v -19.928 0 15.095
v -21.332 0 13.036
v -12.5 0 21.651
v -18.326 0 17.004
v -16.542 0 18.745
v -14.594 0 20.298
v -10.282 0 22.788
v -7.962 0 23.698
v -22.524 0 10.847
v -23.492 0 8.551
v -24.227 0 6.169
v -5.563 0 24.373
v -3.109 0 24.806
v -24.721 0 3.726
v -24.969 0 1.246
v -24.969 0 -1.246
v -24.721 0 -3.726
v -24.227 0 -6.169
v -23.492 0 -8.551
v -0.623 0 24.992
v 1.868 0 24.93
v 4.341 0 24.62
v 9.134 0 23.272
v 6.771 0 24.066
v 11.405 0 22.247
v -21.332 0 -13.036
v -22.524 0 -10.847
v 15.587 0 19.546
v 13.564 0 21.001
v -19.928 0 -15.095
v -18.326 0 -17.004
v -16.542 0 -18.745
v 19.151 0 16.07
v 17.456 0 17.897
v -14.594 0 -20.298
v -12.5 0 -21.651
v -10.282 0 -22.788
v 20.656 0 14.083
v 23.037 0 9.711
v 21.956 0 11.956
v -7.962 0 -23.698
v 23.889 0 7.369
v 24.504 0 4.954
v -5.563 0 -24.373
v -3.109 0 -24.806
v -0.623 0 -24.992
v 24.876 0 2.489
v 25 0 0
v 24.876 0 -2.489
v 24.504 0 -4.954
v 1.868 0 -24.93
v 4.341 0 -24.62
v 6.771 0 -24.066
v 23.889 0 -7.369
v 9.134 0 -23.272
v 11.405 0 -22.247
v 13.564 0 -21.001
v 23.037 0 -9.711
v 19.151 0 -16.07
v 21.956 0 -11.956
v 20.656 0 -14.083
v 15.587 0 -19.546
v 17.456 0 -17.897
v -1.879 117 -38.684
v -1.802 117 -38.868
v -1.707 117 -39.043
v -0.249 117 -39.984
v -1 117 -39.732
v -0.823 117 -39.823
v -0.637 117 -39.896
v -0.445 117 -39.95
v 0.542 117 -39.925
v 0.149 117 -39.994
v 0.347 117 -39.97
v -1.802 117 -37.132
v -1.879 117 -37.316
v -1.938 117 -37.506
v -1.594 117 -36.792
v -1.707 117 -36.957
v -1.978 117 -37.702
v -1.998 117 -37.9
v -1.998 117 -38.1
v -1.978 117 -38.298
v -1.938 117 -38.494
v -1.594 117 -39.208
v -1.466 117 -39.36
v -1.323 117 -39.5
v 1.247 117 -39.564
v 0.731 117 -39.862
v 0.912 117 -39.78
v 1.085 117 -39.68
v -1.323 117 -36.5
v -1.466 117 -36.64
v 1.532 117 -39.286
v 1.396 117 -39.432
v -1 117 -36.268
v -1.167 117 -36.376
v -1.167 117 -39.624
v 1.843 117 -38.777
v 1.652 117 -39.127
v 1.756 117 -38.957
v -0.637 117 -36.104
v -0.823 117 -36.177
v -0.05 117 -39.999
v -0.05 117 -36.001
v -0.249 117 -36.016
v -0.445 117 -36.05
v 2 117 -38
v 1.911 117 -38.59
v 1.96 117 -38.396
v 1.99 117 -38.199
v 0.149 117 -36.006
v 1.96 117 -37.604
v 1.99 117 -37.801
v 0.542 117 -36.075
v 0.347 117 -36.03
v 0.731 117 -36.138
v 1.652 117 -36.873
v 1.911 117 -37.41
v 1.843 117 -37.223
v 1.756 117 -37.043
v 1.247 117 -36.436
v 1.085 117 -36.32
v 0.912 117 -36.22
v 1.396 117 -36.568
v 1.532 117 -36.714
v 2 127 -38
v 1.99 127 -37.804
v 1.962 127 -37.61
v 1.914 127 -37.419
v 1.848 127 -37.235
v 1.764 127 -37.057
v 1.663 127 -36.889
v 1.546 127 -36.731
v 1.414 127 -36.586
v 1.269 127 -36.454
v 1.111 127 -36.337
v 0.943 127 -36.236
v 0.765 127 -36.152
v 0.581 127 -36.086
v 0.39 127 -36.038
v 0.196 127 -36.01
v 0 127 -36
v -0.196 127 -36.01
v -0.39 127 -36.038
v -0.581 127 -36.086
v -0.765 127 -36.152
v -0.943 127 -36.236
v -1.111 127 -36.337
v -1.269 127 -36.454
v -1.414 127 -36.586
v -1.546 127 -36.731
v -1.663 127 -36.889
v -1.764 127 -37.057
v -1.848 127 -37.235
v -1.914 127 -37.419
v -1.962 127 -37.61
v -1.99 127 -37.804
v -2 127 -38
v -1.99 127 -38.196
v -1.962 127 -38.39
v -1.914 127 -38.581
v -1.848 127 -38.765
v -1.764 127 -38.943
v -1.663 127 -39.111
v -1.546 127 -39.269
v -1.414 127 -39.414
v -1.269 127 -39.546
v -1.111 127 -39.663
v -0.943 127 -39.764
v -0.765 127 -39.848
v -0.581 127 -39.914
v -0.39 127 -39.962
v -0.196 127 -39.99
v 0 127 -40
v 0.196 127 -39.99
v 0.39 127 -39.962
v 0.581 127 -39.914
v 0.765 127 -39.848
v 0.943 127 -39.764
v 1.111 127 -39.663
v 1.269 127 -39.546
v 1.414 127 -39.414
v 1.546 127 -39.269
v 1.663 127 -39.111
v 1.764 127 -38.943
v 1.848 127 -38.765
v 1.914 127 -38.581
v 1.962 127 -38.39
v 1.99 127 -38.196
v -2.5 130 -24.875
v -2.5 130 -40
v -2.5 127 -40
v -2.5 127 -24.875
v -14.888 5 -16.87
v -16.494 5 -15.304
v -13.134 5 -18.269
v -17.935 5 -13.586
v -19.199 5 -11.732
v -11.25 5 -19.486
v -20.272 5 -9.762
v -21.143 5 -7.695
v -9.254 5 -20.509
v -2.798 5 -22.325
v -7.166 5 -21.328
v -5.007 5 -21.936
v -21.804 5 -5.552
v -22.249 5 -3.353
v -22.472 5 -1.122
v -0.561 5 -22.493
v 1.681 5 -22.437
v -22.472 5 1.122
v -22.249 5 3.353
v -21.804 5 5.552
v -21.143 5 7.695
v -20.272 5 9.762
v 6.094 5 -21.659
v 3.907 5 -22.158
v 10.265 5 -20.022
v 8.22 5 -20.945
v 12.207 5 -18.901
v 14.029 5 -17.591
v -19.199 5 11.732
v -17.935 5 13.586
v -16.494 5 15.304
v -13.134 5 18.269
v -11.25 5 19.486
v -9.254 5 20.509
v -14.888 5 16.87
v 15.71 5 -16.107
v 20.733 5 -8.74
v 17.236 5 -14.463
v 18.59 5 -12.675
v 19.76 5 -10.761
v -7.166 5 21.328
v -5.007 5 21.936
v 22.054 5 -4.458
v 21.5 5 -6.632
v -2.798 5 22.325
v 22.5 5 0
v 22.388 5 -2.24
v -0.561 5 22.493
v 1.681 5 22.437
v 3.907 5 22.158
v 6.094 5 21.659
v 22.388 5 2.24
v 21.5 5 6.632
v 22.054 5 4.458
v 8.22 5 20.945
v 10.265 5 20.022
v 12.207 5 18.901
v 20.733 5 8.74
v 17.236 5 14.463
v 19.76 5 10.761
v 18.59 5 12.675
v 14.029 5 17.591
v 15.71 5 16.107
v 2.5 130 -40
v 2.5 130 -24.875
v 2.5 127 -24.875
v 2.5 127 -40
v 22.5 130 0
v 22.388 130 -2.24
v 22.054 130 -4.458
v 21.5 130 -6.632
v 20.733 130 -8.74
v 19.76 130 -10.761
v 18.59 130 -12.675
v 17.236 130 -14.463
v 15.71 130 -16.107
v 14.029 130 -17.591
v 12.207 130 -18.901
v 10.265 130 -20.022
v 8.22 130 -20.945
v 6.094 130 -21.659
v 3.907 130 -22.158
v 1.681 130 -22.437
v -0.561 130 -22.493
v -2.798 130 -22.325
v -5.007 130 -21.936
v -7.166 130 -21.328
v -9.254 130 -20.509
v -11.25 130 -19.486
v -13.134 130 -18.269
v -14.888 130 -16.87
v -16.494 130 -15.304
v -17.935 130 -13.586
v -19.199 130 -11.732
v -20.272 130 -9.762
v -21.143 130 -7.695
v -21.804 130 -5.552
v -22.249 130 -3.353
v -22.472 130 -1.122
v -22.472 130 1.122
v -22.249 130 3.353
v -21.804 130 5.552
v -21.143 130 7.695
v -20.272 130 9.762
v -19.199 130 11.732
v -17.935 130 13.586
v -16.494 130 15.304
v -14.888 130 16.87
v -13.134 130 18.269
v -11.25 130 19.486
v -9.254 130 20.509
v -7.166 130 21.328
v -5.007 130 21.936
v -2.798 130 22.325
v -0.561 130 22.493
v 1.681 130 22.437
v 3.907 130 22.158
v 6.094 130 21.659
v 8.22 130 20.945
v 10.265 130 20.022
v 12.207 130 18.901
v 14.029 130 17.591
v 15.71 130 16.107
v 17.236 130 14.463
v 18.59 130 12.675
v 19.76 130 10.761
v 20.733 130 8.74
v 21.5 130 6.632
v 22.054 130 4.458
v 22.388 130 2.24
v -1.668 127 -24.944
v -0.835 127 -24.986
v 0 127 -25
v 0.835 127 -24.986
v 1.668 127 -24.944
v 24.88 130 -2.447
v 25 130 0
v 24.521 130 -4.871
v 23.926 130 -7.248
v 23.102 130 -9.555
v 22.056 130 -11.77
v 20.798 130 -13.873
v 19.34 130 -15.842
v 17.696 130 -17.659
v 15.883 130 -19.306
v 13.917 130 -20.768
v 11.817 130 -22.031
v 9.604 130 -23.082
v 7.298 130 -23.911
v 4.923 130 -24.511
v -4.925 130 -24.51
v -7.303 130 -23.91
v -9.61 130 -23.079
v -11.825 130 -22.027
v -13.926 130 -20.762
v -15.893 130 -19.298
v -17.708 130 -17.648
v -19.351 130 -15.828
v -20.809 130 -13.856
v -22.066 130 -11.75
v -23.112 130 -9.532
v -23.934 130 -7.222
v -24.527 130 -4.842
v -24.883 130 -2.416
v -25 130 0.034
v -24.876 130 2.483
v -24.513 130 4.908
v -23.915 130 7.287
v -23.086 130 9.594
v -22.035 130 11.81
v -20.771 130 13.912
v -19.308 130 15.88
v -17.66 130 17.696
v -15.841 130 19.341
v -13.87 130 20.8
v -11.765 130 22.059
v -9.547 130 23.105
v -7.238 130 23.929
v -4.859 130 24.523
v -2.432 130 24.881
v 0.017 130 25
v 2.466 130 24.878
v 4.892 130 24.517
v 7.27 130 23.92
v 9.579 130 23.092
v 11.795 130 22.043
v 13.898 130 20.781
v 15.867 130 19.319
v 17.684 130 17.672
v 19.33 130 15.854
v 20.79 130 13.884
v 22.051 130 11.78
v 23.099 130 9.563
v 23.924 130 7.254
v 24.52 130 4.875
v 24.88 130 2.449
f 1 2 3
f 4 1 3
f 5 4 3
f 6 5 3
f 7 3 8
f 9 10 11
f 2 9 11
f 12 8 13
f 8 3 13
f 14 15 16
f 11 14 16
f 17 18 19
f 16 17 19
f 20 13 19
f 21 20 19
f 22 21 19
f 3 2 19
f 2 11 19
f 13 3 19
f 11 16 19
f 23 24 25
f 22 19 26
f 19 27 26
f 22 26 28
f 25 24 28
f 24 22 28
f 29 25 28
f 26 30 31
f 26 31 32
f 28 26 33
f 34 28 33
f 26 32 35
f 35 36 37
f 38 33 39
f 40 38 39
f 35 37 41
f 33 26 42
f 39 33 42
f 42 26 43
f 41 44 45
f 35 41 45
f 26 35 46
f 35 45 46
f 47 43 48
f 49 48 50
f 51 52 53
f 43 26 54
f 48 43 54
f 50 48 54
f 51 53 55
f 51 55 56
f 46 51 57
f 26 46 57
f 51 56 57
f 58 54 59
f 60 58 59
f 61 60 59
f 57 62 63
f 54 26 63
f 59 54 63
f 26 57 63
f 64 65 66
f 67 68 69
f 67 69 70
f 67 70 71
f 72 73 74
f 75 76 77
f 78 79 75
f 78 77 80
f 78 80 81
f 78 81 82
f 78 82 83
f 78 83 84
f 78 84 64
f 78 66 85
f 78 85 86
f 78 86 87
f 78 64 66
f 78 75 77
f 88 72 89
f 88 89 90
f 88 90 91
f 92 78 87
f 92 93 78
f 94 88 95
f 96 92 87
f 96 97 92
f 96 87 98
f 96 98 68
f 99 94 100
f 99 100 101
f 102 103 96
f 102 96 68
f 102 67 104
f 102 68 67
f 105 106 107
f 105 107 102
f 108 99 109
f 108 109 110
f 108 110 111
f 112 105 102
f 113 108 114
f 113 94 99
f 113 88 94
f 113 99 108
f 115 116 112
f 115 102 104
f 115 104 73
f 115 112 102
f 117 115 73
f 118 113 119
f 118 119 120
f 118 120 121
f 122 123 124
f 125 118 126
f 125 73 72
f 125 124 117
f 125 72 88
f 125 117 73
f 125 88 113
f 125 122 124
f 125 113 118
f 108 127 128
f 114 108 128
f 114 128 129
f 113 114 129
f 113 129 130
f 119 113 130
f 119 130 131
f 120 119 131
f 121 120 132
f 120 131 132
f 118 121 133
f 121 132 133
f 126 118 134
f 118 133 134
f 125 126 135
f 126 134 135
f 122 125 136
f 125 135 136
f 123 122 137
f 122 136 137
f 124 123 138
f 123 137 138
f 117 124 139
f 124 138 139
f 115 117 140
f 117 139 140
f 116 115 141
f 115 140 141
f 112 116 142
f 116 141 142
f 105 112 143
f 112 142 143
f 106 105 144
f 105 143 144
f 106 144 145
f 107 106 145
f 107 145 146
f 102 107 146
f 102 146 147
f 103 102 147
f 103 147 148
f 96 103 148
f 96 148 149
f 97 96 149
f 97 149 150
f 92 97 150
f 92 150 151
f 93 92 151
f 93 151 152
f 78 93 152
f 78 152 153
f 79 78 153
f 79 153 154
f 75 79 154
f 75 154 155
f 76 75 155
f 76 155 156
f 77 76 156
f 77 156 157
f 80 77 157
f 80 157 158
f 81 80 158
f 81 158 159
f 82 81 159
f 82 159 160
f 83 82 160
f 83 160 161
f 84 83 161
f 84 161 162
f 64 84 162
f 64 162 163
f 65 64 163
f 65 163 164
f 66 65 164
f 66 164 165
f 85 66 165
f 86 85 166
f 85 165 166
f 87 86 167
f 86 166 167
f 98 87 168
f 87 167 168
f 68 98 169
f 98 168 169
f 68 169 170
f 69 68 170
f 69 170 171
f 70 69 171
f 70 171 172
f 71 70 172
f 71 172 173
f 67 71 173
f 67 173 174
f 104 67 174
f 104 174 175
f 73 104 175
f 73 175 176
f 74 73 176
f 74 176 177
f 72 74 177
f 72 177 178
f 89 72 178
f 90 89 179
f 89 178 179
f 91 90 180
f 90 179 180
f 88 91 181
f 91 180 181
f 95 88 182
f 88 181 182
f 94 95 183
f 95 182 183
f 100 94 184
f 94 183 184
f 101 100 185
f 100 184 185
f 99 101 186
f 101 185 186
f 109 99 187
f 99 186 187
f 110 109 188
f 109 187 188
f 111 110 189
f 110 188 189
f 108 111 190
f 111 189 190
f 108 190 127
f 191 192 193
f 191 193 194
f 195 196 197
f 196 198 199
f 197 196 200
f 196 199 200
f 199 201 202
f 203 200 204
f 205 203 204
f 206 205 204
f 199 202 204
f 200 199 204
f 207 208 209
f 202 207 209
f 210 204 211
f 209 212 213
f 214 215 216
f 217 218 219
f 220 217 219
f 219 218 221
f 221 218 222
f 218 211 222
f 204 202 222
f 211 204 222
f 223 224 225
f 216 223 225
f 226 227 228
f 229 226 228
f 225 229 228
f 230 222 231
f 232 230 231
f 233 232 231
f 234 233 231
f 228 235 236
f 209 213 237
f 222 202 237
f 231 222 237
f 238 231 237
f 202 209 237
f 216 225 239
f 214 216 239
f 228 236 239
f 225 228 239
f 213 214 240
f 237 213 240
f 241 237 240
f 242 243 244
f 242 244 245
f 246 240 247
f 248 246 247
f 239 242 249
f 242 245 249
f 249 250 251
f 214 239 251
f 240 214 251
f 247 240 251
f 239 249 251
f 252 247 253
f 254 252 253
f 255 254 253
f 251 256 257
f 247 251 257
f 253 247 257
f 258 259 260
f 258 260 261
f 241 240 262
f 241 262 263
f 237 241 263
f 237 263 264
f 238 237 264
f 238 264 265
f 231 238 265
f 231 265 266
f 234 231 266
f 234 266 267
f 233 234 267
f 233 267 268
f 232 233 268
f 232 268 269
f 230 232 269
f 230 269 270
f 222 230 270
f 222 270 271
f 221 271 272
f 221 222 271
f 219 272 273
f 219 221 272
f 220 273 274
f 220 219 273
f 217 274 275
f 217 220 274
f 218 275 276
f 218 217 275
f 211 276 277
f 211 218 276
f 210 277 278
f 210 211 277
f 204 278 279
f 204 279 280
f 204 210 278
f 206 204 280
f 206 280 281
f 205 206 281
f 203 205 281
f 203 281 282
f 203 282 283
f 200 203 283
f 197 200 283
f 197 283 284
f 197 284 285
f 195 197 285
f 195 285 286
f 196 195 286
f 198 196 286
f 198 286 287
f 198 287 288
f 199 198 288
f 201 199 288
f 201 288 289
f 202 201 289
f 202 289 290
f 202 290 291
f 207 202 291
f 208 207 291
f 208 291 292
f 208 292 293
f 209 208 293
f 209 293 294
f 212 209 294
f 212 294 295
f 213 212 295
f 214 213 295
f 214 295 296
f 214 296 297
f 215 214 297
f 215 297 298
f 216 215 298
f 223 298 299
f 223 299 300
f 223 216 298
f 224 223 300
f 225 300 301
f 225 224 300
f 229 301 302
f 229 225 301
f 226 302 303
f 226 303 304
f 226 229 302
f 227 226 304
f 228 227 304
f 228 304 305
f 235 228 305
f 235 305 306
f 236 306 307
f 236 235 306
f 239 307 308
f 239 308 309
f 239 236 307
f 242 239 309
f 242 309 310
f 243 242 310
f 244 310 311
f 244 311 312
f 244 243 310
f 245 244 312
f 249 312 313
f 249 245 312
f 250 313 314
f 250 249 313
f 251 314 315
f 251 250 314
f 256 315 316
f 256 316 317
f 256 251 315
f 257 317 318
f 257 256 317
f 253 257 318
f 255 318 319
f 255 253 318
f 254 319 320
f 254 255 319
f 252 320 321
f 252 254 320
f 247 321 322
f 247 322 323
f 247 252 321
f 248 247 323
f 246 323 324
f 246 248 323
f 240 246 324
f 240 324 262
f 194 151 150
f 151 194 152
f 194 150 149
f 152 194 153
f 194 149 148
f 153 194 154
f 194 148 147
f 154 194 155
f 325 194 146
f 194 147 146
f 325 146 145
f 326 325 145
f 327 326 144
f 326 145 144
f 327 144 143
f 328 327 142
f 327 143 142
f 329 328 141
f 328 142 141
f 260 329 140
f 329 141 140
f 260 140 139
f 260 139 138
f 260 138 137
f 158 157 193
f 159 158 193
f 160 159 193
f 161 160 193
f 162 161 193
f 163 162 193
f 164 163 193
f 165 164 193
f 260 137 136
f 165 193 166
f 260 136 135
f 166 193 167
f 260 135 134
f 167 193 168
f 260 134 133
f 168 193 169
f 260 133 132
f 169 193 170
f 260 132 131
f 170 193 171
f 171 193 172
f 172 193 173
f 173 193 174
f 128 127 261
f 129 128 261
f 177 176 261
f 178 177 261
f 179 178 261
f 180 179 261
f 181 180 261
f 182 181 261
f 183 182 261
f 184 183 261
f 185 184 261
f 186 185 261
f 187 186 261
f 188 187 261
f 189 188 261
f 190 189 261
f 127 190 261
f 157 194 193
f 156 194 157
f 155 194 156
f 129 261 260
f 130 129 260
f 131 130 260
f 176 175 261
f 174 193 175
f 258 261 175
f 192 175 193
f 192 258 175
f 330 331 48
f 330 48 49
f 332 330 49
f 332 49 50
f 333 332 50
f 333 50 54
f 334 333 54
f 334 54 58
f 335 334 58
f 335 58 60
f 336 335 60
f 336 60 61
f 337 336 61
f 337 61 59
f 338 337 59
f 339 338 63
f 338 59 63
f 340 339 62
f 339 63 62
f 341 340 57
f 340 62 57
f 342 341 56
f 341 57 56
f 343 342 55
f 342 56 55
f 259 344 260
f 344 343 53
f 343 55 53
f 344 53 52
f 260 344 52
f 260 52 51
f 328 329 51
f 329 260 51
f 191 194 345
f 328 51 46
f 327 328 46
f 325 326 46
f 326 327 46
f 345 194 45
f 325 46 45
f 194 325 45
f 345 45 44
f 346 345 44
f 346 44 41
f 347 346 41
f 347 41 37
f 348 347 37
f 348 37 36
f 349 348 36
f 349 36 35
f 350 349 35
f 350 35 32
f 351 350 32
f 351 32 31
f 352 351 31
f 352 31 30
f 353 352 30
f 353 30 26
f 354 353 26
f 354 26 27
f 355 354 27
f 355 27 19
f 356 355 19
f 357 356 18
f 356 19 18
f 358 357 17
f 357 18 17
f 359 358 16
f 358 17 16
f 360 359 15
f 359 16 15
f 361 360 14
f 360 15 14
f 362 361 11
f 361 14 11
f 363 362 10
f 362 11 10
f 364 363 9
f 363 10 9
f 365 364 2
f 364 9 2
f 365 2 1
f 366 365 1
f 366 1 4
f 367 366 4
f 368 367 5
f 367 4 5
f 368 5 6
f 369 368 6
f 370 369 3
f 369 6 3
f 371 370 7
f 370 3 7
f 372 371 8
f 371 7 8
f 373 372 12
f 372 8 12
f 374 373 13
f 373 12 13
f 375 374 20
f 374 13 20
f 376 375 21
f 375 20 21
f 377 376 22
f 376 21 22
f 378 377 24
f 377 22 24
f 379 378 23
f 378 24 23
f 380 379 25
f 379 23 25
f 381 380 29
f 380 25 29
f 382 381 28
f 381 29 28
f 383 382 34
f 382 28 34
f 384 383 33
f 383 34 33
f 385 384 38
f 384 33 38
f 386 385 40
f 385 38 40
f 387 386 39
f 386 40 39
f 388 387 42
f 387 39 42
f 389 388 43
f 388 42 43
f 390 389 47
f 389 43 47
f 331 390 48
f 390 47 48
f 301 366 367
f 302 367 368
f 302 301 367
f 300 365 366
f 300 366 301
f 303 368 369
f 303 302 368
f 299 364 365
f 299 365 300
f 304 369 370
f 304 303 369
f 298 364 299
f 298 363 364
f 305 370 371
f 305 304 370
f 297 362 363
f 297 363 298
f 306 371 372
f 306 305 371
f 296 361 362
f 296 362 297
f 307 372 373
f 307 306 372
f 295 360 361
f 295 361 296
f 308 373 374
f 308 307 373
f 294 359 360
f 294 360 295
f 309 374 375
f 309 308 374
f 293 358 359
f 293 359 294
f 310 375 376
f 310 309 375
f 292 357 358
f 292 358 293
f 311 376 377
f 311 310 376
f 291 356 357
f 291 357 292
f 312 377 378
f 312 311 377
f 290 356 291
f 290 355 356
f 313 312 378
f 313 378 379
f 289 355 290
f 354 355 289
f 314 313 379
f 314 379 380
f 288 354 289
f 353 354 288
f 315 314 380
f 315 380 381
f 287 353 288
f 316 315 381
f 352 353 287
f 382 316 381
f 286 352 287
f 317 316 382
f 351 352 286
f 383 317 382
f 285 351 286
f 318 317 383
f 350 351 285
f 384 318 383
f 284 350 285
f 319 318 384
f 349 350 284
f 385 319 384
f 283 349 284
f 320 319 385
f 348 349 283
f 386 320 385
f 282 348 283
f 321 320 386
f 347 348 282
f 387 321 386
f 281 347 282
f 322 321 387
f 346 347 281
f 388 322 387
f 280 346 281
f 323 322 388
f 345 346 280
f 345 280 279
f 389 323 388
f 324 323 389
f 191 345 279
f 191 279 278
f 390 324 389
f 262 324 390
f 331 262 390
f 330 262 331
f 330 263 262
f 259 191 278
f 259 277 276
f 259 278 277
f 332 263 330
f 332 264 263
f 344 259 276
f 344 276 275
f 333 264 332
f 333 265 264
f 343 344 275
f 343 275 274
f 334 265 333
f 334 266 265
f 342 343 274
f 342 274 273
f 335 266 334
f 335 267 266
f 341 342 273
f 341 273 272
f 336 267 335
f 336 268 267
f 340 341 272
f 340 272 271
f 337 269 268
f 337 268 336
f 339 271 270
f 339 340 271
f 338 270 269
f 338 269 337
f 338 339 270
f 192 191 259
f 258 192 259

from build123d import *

# Parameters (mm, degrees)
SKETCH1_R           = 25
SKETCH1_R_2         = 22.5
BOSS_EXTRUDE1_DEPTH = 130
SKETCH2_R           = 25
BOSS_EXTRUDE2_DEPTH = 5
BOSS_EXTRUDE3_DEPTH = 3
SKETCH4_R           = 2
BOSS_EXTRUDE4_DEPTH = 10


with BuildPart() as part:
    # Sketch1 → Boss-Extrude1 (new body)
    with BuildSketch(Plane(origin=(0, 0, 0), x_dir=(1, 0, 0), z_dir=(0, 1, 0))):
        Circle(SKETCH1_R)
        Circle(SKETCH1_R_2, mode=Mode.SUBTRACT)
    extrude(amount=BOSS_EXTRUDE1_DEPTH)

    # Sketch2 → Boss-Extrude2 (add)
    with BuildSketch(Plane.XZ):
        Circle(SKETCH2_R)
    extrude(amount=-BOSS_EXTRUDE2_DEPTH)

    # Sketch3 → Boss-Extrude3 (add)
    with BuildSketch(Plane(origin=(0, 130, 0), x_dir=(1, 0, 0), z_dir=(0, 1, 0))):
        with BuildLine():
            ThreePointArc((-2.5, 24.874685928), (-1.251569376, 24.968651828), (0, 25))
            Line((0, 25), (0, 40))
            Line((0, 40), (-2.5, 40))
            Line((-2.5, 40), (-2.5, 24.874685928))
        make_face()
        with BuildLine():
            Line((0, 40), (0, 25))
            ThreePointArc((0, 25), (1.251569376, 24.968651828), (2.5, 24.874685928))
            Line((2.5, 24.874685928), (2.5, 40))
            Line((2.5, 40), (0, 40))
        make_face()
    extrude(amount=-BOSS_EXTRUDE3_DEPTH)

    # Sketch4 → Boss-Extrude4 (add)
    with BuildSketch(Plane.XZ.offset(-127)):
        with Locations((0, -38)):
            Circle(SKETCH4_R)
    extrude(amount=BOSS_EXTRUDE4_DEPTH)


solid = part.part
